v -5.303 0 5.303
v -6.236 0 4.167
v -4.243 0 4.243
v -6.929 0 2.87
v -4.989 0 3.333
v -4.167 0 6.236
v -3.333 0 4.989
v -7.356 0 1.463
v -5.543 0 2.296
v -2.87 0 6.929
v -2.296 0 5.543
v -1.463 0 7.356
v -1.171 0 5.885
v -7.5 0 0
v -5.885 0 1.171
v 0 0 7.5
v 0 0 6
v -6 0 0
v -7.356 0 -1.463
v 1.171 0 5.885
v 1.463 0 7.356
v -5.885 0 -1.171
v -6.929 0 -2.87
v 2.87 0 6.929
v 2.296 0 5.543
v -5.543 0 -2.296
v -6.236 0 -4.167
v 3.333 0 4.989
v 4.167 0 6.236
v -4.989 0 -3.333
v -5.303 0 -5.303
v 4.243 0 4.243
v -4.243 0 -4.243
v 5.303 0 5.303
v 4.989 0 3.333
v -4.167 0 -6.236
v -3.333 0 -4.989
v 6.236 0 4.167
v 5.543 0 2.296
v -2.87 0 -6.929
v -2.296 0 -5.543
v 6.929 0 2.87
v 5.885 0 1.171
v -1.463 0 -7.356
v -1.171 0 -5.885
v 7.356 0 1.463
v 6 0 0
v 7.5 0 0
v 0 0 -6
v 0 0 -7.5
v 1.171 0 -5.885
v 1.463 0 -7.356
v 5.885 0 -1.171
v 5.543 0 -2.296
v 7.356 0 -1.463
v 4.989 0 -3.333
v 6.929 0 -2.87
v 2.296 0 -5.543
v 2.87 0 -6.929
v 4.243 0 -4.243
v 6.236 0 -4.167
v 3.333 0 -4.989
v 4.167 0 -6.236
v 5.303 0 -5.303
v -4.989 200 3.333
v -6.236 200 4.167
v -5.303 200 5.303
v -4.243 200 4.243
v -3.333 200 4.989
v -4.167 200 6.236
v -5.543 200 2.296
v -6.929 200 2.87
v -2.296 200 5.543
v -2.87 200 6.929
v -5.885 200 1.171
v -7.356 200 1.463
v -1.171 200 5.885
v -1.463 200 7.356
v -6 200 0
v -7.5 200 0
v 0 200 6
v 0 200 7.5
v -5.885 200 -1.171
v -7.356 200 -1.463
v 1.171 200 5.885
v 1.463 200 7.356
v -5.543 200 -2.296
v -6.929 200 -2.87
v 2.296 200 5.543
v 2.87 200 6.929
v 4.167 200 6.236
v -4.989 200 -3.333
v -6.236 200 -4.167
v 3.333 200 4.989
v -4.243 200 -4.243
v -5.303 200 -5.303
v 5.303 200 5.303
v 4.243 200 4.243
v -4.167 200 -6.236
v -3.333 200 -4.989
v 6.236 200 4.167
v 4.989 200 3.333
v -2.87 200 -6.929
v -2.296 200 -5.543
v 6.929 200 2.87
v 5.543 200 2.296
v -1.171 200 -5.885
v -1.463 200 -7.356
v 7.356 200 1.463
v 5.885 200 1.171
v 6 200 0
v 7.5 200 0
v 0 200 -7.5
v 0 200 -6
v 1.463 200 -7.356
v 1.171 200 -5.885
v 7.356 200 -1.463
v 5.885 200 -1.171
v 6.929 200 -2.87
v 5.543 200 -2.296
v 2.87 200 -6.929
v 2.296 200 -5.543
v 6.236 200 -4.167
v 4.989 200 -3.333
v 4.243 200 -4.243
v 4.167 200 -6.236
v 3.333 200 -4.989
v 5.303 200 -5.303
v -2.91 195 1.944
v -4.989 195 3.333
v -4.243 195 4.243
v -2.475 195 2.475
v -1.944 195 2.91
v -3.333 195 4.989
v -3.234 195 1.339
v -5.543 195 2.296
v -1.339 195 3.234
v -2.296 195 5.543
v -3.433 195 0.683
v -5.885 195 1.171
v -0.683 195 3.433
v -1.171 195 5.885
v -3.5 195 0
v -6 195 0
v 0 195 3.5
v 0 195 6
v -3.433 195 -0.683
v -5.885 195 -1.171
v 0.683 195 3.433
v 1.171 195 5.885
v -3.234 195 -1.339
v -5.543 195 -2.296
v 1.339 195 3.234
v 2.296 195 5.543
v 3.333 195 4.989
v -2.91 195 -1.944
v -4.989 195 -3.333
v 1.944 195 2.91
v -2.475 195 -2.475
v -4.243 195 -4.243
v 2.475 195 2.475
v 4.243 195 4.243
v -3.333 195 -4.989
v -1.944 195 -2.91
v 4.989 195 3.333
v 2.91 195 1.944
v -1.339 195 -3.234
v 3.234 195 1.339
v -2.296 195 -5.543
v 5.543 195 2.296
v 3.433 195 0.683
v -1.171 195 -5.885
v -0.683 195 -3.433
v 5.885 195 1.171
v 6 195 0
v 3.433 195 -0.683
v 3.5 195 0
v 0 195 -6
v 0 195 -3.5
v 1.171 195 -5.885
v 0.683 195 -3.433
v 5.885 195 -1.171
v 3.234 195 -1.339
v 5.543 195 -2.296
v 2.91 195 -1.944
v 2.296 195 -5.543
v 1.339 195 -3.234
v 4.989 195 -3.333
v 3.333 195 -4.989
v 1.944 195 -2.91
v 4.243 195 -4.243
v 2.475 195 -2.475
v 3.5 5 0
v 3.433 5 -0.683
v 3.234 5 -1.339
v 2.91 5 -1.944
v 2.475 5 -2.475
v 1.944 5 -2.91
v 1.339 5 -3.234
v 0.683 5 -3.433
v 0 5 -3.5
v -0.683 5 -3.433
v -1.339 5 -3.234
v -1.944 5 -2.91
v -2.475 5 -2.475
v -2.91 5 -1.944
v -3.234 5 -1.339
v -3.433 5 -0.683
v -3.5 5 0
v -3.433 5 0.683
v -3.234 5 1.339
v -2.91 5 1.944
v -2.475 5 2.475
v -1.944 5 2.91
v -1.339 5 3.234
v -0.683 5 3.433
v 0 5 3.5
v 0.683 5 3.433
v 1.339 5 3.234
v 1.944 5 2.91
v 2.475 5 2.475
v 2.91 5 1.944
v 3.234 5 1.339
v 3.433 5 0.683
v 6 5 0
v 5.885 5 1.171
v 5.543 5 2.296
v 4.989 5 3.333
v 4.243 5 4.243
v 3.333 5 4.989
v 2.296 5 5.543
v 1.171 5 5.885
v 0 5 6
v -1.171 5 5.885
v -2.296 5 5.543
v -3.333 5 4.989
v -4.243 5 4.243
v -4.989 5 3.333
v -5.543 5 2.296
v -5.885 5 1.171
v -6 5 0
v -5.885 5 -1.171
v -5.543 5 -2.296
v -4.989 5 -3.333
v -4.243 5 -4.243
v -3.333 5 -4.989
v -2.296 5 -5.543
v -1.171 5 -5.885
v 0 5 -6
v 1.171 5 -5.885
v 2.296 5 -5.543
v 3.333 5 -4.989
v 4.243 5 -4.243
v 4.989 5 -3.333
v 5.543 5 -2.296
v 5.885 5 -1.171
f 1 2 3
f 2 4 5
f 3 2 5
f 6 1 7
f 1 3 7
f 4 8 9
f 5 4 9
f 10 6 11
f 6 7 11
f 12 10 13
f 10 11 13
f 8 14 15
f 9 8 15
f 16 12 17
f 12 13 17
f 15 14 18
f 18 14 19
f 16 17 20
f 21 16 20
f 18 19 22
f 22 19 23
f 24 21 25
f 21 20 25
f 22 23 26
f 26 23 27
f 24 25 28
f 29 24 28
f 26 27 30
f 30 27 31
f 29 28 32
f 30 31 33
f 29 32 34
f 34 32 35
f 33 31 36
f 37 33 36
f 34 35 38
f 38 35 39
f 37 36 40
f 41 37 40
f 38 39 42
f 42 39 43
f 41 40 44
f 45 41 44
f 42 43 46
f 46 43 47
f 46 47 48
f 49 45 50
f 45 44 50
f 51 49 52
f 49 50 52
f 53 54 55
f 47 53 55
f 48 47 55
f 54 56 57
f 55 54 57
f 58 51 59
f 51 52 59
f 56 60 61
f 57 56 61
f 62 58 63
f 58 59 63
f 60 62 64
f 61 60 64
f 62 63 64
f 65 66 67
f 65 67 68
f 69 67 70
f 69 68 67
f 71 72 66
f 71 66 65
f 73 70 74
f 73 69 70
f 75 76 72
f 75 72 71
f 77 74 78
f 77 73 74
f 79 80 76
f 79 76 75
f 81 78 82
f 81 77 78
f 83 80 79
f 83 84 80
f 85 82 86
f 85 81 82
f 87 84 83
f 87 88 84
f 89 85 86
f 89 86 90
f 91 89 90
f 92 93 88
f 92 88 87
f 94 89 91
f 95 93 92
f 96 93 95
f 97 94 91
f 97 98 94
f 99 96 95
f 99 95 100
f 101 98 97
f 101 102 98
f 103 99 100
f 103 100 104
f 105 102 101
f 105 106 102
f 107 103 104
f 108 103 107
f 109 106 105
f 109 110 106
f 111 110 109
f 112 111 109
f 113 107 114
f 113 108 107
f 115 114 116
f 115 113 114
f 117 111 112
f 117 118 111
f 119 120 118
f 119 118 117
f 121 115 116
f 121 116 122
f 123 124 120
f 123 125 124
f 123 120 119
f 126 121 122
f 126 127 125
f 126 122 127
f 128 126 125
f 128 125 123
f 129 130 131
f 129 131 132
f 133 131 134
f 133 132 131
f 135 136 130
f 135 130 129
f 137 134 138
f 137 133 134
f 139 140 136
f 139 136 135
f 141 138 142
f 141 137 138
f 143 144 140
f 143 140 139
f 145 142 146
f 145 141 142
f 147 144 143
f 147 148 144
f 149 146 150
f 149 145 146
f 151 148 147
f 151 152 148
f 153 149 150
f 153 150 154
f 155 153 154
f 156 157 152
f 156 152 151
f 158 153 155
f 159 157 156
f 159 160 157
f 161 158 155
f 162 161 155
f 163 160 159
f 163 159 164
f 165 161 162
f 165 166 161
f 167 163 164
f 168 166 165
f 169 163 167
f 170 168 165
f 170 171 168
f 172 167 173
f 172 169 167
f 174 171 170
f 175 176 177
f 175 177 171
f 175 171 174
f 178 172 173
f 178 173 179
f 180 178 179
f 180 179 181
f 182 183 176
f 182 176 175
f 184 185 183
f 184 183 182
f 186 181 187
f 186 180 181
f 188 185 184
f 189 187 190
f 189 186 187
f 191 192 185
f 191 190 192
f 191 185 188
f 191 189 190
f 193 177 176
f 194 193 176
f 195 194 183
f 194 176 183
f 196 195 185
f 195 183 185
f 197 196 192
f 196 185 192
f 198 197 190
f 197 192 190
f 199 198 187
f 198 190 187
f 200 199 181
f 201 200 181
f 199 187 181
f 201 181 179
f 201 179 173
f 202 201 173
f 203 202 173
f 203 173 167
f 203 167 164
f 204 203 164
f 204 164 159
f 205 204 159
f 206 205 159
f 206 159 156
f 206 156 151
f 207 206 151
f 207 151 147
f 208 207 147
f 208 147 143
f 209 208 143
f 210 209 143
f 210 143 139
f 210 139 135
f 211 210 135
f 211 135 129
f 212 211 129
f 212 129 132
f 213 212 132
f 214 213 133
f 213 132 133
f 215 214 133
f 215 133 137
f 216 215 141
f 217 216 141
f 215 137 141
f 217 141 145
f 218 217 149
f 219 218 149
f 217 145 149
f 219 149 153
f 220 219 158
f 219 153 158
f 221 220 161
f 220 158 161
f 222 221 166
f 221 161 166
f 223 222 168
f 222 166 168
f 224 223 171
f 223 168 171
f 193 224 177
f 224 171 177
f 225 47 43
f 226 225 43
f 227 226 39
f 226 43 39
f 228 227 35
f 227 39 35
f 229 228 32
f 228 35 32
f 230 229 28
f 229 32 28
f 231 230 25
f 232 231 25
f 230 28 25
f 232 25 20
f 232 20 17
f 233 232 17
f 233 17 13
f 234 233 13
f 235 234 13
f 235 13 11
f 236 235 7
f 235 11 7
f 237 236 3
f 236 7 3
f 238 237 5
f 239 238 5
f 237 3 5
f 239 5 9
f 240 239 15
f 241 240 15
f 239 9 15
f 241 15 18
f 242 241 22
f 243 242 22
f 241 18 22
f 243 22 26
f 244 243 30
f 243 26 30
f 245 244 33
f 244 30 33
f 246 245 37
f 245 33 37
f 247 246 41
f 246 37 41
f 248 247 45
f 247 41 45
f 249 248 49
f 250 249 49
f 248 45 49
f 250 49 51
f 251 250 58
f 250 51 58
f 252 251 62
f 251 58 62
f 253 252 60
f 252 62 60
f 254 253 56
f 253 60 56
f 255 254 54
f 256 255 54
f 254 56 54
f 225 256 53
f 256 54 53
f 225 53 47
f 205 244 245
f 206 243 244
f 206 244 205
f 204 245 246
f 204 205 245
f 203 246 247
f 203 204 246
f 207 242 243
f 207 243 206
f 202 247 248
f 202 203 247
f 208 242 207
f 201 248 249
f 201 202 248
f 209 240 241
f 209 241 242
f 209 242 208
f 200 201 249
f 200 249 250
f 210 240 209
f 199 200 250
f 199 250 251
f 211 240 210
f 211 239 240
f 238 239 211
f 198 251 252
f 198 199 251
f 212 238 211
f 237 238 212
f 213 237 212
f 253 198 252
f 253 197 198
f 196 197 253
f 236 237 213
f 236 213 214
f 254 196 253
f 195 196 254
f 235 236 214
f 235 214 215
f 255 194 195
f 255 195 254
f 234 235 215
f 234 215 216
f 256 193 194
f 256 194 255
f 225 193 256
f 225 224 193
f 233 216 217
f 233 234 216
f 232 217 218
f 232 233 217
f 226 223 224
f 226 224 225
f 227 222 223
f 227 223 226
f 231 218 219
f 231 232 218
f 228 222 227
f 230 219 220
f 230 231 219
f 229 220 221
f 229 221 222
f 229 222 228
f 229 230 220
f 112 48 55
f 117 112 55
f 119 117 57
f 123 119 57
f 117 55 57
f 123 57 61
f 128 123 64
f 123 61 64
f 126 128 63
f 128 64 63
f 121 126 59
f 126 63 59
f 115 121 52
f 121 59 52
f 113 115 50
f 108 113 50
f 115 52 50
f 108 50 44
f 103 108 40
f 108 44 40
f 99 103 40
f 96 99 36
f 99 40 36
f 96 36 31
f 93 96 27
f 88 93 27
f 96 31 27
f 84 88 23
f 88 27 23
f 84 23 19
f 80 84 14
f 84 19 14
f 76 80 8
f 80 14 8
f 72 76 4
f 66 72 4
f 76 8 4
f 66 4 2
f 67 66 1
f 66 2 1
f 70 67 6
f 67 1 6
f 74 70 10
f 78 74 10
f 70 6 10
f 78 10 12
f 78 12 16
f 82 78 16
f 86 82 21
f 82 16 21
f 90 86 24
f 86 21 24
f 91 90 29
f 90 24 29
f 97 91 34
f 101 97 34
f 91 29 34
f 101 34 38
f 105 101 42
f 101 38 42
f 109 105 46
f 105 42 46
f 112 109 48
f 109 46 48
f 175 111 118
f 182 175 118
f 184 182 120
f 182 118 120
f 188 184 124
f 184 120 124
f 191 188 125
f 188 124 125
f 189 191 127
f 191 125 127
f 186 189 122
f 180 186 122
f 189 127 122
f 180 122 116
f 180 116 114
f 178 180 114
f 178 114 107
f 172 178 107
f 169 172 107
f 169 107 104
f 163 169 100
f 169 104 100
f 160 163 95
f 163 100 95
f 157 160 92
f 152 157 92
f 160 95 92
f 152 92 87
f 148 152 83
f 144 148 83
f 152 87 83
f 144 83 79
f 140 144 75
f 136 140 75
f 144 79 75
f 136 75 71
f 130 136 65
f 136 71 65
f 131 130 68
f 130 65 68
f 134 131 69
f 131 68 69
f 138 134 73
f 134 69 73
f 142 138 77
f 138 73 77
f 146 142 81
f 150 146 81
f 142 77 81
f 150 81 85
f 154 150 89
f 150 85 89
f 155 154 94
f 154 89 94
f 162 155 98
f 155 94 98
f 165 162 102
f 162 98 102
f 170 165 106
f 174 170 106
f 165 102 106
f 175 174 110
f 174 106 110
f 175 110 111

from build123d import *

# Parameters (mm, degrees)
SKETCH_1_R          = 7.5
EXTRUDE_1_DEPTH     = 200
SKETCH_2_R          = 3.5
CUT_EXTRUDE_1_DEPTH = 201
SKETCH_4_R          = 6
CUT_EXTRUDE_3_DEPTH = 5
SKETCH_7_R          = 6
CUT_EXTRUDE_4_DEPTH = 5


with BuildPart() as part:
    # Эскиз1 → Бобышка-Вытянуть1 (new body)
    with BuildSketch(Plane(origin=(0, 0, 0), x_dir=(1, 0, 0), z_dir=(0, 1, 0))):
        Circle(SKETCH_1_R)
    extrude(amount=EXTRUDE_1_DEPTH)

    # Эскиз2 → Вырез-Вытянуть1 (cut, through all)
    with BuildSketch(Plane(origin=(0, 200, 0), x_dir=(1, 0, 0), z_dir=(0, 1, 0))):
        Circle(SKETCH_2_R)
    extrude(amount=-CUT_EXTRUDE_1_DEPTH, mode=Mode.SUBTRACT)

    # Эскиз4 → Вырез-Вытянуть3 (cut)
    with BuildSketch(Plane(origin=(0, 200, 0), x_dir=(1, 0, 0), z_dir=(0, 1, 0))):
        Circle(SKETCH_4_R)
    extrude(amount=-CUT_EXTRUDE_3_DEPTH, mode=Mode.SUBTRACT)

    # Эскиз7 → Вырез-Вытянуть4 (cut)
    with BuildSketch(Plane.XZ):
        Circle(SKETCH_7_R)
    extrude(amount=-CUT_EXTRUDE_4_DEPTH, mode=Mode.SUBTRACT)


solid = part.part
